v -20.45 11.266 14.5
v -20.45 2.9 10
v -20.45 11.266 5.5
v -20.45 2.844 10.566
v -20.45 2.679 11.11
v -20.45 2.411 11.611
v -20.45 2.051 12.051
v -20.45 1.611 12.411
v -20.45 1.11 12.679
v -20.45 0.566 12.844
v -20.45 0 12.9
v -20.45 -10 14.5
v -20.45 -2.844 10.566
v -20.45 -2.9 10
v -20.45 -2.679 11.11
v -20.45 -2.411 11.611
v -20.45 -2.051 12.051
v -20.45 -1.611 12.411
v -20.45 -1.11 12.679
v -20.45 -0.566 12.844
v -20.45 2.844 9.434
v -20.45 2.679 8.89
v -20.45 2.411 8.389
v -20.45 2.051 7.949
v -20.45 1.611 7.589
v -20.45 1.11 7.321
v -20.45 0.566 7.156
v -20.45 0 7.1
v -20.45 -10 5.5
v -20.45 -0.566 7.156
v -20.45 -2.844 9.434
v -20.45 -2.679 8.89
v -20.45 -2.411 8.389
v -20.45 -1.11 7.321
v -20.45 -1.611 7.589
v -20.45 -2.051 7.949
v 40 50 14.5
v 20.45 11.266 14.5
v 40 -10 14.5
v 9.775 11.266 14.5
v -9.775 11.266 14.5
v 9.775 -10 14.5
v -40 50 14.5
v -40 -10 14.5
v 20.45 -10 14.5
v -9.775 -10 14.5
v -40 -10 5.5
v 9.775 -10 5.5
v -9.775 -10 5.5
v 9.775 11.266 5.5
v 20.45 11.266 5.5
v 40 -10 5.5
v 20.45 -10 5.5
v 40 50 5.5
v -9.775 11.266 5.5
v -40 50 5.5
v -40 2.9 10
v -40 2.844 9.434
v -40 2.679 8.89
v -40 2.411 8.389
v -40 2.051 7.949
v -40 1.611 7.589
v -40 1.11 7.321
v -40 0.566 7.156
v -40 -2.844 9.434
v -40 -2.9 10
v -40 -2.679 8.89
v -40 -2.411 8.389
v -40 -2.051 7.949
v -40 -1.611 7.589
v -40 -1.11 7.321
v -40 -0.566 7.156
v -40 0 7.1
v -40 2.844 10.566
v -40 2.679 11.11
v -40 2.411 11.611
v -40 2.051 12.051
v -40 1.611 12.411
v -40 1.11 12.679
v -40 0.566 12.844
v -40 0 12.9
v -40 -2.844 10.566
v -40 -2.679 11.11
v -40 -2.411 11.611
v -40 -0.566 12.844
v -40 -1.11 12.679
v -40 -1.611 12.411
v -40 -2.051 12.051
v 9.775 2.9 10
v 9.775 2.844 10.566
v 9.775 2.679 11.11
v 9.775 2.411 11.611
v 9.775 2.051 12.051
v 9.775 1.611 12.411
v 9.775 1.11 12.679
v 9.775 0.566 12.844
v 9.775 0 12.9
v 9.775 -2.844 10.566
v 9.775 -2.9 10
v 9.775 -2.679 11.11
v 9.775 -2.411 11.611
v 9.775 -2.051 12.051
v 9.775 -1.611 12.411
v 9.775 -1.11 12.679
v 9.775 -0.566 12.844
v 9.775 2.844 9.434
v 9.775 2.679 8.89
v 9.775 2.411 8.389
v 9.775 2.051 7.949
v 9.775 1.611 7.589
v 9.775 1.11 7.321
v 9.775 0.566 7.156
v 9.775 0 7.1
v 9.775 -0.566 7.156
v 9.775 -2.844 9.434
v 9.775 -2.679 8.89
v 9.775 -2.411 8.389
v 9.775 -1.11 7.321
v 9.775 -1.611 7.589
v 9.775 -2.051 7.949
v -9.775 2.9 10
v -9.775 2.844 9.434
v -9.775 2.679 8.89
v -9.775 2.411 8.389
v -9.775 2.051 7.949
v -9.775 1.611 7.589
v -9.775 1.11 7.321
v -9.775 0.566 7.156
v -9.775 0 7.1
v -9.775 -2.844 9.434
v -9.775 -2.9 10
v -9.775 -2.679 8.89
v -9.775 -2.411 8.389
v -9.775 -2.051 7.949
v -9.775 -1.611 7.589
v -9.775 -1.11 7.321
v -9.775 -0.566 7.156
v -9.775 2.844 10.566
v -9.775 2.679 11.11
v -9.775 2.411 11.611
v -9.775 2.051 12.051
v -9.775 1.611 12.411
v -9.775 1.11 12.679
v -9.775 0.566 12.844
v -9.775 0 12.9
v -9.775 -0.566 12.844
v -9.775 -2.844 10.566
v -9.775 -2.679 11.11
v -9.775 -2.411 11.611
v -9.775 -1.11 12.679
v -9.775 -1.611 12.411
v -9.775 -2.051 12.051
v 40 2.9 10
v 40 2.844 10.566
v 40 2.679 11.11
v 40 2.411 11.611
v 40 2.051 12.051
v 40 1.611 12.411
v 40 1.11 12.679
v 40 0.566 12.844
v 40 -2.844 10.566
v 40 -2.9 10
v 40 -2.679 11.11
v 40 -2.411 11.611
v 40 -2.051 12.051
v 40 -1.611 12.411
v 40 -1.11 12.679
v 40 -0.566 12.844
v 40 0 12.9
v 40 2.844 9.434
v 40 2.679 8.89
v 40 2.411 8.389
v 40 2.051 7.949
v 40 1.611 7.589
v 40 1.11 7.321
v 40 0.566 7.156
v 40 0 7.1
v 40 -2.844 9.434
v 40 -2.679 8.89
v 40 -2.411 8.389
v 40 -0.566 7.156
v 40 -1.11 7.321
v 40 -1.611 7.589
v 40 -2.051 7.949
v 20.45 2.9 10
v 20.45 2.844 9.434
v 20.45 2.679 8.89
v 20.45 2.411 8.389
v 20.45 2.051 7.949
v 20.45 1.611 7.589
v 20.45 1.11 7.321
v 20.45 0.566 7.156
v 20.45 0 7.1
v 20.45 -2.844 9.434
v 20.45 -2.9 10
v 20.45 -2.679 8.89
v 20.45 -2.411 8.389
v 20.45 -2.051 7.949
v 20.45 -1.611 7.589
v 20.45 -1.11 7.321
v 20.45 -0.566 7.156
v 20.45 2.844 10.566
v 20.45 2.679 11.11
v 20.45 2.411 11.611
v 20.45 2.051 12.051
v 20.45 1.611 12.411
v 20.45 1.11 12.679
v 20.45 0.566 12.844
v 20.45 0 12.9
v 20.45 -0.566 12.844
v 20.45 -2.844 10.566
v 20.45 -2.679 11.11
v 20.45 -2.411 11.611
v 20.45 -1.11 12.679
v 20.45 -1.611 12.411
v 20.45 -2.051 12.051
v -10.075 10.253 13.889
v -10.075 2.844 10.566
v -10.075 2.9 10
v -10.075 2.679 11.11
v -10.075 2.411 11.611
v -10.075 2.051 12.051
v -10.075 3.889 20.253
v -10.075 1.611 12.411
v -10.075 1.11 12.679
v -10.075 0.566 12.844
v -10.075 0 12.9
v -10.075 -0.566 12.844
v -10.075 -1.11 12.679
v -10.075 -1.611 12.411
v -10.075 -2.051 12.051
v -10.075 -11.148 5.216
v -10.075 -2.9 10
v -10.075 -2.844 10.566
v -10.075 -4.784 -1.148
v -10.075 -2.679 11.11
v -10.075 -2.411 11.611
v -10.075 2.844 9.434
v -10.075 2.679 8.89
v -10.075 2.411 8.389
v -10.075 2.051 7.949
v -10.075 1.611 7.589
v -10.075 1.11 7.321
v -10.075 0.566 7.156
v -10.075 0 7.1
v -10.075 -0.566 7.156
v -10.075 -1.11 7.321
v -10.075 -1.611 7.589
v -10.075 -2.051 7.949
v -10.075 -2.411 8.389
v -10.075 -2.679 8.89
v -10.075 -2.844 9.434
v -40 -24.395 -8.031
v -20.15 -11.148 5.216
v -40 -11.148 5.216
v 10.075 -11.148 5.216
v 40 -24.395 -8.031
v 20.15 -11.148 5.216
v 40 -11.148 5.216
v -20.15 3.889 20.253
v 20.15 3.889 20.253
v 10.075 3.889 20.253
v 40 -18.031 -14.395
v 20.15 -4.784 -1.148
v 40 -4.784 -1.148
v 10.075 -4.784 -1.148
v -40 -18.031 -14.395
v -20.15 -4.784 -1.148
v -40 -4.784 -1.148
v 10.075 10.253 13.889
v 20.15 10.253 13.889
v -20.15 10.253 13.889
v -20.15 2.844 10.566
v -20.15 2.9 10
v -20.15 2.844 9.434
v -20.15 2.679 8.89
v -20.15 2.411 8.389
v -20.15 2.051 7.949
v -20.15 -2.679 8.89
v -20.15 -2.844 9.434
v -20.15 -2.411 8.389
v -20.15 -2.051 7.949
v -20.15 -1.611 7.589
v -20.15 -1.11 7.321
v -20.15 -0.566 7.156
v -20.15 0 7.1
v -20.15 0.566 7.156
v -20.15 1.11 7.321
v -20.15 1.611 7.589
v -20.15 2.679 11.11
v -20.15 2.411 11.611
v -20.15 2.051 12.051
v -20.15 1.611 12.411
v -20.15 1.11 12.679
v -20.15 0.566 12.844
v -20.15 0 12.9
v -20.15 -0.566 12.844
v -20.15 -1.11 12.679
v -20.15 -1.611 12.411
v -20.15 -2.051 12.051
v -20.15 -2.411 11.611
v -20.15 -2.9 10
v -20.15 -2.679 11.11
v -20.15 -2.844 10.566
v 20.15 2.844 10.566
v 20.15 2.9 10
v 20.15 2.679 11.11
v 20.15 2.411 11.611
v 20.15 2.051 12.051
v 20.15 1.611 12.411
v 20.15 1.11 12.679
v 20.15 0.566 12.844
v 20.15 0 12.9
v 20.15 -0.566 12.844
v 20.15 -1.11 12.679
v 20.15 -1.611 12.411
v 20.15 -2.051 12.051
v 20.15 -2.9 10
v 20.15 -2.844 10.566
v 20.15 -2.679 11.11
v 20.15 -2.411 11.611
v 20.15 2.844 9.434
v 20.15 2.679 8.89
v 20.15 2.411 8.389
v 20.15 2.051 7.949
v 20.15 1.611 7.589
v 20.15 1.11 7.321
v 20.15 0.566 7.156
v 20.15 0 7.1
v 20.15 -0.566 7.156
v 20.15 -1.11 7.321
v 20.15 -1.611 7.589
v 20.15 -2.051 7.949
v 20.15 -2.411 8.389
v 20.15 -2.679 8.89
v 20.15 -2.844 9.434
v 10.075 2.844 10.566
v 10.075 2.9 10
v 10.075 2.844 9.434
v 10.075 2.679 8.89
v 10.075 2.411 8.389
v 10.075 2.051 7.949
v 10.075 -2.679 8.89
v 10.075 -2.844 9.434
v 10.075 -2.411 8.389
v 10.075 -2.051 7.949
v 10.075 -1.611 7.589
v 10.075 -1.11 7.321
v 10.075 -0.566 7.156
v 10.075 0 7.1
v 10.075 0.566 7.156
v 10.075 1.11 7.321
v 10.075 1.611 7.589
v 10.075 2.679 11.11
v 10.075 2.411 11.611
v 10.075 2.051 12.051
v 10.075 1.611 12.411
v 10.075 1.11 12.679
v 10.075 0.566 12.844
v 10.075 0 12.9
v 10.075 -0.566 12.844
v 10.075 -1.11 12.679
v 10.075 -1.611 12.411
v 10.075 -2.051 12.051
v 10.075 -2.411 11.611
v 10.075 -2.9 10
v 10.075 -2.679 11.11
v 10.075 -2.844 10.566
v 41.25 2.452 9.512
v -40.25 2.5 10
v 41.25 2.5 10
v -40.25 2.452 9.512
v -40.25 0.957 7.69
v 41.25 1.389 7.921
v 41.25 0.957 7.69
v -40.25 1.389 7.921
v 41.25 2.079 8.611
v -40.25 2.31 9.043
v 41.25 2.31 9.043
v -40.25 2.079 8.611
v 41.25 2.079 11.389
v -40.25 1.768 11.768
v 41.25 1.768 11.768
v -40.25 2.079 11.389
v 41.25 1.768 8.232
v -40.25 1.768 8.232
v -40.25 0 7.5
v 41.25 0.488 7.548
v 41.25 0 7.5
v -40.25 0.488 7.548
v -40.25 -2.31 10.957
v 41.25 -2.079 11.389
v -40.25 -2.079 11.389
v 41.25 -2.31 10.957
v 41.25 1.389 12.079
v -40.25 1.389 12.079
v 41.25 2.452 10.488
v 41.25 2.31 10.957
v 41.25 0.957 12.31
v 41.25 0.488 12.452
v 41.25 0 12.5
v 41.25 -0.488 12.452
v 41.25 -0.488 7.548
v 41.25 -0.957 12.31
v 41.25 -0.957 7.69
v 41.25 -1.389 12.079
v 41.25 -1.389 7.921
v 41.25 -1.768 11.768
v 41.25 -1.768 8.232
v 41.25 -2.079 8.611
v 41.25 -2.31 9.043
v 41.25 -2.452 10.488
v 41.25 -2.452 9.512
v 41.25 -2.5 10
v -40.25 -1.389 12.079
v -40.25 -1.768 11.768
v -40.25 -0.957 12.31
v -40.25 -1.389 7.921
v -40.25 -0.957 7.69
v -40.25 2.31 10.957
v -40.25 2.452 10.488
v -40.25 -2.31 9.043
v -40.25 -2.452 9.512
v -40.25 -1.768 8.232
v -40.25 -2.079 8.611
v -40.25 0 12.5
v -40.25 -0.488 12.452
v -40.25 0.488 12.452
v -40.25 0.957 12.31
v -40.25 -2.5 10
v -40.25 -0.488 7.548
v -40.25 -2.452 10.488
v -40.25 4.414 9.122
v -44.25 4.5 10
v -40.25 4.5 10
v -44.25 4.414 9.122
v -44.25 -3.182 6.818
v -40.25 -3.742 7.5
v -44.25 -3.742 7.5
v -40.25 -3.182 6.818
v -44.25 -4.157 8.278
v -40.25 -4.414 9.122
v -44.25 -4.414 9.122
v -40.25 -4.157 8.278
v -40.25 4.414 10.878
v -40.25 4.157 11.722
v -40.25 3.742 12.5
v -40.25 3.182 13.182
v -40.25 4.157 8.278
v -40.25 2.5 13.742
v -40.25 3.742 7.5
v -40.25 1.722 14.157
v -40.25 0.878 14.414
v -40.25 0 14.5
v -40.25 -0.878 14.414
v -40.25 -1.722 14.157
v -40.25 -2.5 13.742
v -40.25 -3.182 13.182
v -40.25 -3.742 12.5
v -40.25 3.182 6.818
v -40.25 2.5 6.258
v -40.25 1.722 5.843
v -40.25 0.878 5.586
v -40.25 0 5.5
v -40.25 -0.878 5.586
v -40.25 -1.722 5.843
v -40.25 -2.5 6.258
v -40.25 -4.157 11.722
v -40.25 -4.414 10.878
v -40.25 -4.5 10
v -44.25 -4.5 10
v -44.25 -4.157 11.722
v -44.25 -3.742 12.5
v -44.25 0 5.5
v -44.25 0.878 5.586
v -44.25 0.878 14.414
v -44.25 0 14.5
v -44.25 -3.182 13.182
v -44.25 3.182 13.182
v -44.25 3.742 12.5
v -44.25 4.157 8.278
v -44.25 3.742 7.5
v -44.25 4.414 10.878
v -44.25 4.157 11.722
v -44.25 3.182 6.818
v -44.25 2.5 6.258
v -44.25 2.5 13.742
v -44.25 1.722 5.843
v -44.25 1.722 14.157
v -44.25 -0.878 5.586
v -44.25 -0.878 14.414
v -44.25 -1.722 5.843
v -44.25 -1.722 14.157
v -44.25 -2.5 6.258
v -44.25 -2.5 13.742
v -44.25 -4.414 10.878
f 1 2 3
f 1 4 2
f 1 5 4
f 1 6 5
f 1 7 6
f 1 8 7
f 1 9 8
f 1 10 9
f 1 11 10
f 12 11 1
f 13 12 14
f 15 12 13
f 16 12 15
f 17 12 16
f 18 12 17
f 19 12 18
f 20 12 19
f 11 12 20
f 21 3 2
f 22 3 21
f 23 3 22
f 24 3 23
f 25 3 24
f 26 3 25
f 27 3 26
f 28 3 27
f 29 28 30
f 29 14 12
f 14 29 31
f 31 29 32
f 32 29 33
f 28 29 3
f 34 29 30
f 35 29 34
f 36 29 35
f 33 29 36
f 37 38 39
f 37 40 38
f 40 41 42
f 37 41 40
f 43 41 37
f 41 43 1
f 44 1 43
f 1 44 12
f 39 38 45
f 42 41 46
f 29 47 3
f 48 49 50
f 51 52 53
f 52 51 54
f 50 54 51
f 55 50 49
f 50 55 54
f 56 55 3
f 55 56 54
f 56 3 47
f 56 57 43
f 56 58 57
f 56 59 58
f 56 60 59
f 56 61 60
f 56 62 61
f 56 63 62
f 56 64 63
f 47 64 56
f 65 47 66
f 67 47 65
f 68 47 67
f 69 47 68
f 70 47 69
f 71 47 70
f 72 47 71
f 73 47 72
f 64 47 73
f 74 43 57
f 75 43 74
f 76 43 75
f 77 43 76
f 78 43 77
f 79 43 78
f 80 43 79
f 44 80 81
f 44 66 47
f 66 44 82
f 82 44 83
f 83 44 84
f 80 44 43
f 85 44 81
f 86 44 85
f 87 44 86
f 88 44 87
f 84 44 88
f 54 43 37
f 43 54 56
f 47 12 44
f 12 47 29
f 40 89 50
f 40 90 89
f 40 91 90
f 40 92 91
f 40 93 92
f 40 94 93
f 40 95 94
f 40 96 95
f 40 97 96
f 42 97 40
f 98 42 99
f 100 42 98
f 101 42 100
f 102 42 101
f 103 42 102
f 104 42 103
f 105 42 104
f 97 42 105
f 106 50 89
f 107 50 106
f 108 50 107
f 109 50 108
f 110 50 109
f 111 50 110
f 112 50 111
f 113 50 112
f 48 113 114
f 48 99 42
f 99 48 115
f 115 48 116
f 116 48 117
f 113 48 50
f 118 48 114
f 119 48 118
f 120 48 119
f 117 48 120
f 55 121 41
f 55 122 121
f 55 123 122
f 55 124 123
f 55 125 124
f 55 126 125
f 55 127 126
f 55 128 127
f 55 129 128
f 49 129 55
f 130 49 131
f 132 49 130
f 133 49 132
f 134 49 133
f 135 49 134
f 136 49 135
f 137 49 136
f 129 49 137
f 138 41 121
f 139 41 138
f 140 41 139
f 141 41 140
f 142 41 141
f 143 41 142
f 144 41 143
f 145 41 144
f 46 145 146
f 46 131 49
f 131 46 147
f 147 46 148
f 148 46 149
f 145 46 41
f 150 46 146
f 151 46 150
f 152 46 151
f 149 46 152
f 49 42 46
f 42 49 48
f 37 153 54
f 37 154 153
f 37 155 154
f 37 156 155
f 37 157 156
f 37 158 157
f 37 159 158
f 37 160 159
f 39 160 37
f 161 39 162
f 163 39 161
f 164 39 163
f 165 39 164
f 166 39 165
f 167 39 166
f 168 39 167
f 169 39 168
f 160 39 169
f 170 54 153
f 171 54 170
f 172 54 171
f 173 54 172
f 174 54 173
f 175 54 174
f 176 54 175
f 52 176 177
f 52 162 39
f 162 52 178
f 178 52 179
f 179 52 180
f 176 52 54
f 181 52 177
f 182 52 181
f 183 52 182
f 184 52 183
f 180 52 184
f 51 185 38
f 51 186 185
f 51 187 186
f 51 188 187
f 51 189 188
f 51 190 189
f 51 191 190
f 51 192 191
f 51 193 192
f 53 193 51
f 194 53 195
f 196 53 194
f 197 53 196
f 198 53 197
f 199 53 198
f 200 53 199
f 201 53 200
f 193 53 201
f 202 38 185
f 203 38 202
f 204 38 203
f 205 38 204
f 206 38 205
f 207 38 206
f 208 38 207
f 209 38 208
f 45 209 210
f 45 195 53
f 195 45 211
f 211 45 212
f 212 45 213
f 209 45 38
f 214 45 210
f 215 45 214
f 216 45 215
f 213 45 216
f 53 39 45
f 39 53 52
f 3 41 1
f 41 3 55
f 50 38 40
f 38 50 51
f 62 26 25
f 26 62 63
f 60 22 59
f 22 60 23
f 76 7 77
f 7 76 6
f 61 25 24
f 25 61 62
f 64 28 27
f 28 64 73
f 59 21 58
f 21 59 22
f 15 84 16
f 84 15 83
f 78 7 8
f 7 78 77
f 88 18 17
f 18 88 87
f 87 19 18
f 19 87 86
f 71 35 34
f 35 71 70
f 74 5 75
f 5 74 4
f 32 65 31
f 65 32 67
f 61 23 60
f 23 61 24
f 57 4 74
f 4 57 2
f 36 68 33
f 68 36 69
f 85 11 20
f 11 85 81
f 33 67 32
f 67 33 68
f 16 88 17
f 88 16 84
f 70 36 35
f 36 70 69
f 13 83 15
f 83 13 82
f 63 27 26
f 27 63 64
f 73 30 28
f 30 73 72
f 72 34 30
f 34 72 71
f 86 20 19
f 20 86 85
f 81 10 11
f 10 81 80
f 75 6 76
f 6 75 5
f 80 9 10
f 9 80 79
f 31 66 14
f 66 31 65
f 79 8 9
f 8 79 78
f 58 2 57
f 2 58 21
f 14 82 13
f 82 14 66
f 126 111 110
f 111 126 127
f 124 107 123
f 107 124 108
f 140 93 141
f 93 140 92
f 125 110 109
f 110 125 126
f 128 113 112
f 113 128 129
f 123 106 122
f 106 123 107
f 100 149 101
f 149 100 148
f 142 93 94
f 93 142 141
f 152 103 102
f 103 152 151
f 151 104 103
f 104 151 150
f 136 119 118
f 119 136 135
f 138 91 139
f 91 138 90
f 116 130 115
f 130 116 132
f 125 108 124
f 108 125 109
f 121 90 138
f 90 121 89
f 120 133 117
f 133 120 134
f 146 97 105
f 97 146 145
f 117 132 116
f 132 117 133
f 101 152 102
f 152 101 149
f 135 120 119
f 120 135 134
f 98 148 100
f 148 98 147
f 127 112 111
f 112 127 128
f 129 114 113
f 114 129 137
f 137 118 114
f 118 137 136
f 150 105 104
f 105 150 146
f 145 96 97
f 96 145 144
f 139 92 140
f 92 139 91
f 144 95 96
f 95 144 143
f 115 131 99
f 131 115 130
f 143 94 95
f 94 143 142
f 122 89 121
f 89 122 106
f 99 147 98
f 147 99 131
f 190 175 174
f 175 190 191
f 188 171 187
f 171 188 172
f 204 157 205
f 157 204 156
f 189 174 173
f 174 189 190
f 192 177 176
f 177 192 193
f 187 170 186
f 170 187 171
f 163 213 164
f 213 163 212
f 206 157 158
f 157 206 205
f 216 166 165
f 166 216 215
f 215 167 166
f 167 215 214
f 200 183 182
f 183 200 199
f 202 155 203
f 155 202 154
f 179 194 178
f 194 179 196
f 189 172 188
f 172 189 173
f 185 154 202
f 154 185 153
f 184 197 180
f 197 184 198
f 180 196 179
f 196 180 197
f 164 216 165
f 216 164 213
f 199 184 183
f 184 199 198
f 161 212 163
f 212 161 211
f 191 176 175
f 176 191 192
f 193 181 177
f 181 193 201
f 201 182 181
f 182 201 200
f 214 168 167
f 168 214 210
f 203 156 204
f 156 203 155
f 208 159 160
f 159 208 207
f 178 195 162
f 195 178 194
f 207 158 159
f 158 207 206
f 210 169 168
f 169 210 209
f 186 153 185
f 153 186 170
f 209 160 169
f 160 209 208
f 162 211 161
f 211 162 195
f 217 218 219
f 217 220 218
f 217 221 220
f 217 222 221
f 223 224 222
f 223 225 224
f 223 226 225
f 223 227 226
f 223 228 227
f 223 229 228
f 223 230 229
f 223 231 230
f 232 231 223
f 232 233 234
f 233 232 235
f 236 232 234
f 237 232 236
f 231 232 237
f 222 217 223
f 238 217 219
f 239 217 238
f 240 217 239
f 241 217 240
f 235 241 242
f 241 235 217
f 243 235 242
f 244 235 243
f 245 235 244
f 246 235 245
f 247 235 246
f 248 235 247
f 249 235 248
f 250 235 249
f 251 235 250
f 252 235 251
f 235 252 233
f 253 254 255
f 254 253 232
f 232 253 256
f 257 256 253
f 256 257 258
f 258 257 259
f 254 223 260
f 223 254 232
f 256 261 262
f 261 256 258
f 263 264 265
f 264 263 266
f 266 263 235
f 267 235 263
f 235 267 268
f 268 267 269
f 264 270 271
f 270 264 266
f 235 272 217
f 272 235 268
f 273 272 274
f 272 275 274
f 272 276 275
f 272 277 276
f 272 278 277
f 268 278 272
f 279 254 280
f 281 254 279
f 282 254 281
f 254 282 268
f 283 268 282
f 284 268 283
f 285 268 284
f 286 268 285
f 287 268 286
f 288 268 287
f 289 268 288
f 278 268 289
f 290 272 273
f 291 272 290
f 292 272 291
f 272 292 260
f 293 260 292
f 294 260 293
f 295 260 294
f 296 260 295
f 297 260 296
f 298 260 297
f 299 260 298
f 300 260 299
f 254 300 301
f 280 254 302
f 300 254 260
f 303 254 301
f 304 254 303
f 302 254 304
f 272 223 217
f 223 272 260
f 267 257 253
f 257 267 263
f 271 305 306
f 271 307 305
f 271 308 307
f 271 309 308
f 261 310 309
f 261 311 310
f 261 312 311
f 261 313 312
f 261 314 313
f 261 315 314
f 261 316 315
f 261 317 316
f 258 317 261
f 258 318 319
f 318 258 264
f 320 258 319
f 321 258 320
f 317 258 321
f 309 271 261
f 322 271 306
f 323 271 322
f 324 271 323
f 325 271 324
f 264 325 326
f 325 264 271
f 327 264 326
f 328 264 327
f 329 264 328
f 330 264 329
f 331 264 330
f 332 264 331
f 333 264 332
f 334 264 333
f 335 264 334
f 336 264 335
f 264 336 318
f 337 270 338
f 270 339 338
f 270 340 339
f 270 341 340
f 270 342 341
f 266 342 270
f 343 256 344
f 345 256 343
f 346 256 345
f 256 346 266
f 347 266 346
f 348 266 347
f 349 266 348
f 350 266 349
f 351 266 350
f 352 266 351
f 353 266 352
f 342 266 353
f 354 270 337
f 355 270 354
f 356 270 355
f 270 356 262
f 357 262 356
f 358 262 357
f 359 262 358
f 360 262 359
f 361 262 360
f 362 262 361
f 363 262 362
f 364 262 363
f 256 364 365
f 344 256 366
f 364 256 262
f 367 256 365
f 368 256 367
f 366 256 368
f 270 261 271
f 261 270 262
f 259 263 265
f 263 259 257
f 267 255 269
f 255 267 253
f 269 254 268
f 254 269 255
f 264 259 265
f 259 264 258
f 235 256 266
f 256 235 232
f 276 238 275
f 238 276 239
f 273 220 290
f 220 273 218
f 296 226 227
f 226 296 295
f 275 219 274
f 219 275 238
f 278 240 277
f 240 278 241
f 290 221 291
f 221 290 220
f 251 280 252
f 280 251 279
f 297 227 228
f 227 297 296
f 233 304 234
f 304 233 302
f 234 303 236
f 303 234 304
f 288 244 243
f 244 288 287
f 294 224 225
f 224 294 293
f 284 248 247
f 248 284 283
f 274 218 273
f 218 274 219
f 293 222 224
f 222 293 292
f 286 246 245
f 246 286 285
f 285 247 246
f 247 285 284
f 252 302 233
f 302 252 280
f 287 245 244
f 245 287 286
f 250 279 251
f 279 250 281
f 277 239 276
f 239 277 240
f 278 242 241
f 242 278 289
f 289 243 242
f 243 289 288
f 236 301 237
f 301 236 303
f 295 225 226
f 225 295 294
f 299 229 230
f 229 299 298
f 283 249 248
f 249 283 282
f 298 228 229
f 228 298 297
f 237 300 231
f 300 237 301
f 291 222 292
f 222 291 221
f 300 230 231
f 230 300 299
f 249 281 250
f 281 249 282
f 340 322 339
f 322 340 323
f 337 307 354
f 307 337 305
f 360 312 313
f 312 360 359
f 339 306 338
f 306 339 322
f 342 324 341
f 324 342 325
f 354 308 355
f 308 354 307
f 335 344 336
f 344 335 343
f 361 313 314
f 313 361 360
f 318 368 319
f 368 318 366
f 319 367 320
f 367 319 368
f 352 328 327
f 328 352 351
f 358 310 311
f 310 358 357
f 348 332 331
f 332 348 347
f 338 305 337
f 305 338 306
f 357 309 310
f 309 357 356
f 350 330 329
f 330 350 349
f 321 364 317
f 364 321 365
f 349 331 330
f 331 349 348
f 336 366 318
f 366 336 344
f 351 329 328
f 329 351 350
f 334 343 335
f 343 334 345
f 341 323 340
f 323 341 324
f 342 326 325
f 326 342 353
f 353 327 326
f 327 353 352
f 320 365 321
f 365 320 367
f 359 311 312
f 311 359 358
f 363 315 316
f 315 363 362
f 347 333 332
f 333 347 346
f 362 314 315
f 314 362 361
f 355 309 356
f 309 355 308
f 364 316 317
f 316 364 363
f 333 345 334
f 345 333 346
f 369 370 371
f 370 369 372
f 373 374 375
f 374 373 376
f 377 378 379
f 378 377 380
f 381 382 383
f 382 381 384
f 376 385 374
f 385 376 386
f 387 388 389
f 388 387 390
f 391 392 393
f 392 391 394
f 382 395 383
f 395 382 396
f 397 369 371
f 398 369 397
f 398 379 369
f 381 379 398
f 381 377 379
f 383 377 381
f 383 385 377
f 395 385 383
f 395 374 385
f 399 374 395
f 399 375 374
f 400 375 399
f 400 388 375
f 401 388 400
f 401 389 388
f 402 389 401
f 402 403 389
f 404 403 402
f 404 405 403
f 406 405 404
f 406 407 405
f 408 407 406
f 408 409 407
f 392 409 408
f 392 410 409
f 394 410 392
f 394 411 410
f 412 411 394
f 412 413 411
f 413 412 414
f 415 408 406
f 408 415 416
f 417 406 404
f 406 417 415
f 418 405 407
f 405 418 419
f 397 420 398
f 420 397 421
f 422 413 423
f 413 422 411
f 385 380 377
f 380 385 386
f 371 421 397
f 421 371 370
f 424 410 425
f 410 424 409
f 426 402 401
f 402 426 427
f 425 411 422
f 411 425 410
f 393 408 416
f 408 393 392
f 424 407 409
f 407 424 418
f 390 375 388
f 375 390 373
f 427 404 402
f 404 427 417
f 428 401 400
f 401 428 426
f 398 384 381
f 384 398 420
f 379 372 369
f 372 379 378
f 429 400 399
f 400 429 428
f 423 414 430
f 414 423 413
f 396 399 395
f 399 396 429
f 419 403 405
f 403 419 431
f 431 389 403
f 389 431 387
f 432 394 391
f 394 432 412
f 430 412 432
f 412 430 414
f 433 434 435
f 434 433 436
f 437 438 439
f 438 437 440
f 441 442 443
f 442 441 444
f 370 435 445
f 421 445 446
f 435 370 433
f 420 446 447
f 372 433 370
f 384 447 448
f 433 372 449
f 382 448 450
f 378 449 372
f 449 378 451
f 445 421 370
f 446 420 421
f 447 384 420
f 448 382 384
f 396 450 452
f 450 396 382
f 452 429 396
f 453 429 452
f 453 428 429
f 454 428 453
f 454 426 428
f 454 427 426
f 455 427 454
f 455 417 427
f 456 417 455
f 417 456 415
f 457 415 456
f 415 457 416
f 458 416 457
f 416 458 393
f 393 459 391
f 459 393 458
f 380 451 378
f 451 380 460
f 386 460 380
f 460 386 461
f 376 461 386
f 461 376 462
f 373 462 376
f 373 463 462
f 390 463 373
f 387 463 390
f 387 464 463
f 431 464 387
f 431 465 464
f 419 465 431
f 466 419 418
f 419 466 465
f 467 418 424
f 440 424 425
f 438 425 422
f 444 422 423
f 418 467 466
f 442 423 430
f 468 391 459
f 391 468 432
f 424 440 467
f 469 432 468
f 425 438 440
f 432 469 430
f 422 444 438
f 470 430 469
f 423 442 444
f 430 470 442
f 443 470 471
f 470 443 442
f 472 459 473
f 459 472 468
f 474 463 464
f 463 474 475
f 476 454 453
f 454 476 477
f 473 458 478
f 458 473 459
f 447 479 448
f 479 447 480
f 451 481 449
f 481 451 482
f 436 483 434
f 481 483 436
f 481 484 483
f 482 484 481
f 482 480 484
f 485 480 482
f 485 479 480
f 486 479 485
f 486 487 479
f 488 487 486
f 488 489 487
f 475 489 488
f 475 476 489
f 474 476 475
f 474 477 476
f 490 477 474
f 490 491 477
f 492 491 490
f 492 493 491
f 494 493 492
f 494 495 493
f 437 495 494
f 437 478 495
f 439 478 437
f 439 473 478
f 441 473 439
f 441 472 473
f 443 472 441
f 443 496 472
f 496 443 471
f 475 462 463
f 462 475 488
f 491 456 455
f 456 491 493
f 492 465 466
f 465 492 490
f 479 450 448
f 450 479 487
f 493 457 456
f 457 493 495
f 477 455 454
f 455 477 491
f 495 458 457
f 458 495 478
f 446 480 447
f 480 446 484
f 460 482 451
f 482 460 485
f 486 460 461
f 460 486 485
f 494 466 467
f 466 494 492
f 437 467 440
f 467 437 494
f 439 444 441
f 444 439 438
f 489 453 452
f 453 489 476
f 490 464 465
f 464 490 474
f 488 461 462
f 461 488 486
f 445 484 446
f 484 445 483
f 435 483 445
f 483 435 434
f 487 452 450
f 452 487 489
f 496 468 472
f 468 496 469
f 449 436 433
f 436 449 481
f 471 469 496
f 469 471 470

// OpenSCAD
$fn = 32;

// ------------------------------------------------------------------------
// Butt hinge: hinge 80 mm, leaf swung 45 deg
// Every part is its own module, assembly() places every instance.
// ------------------------------------------------------------------------

// --- part 1 ---
module hinge_base() {
  difference() {
    union() {
      translate([-40, -10, -4.5]) cube([19.55, 60, 9]);
      translate([-9.775, -10, -4.5]) cube([19.55, 60, 9]);
      translate([20.45, -10, -4.5]) cube([19.55, 60, 9]);
      translate([-40, 11.266, -4.5]) cube([80, 38.734, 9]);
    }
    translate([-30.225, 0, 0]) rotate([0, 90, 0]) cylinder(h = 21.55, d = 5.8, center = true);
    translate([0, 0, 0]) rotate([0, 90, 0]) cylinder(h = 21.55, d = 5.8, center = true);
    translate([30.225, 0, 0]) rotate([0, 90, 0]) cylinder(h = 21.55, d = 5.8, center = true);
  }
}

// --- part 2 ---
module hinge_mover() {
  difference() {
    union() {
      translate([-20.15, -30, -4.5]) cube([10.075, 40, 9]);
      translate([10.075, -30, -4.5]) cube([10.075, 40, 9]);
      translate([-40, -30, -4.5]) cube([80, 18.734, 9]);
    }
    translate([-15.113, 0, 0]) rotate([0, 90, 0]) cylinder(h = 12.075, d = 5.8, center = true);
    translate([15.113, 0, 0]) rotate([0, 90, 0]) cylinder(h = 12.075, d = 5.8, center = true);
  }
}

// --- part 3 ---
module hinge_pin() {
  rotate([0, 90, 0]) cylinder(h = 82.5, d = 5, center = true);
  translate([-44.25, 0, 0]) rotate([0, 90, 0]) cylinder(h = 4, d = 9);
}

// --- assembly ---
module assembly() {
  color([0.80, 0.24, 0.20]) translate([0, 0, 10]) rotate([0, 0, 0]) hinge_base();
  color([0.20, 0.45, 0.75]) translate([0, 0, 10]) rotate([45, 0, 0]) hinge_mover();
  color([0.25, 0.62, 0.32]) translate([0, 0, 10]) rotate([0, 0, 0]) hinge_pin();
}

assembly();
